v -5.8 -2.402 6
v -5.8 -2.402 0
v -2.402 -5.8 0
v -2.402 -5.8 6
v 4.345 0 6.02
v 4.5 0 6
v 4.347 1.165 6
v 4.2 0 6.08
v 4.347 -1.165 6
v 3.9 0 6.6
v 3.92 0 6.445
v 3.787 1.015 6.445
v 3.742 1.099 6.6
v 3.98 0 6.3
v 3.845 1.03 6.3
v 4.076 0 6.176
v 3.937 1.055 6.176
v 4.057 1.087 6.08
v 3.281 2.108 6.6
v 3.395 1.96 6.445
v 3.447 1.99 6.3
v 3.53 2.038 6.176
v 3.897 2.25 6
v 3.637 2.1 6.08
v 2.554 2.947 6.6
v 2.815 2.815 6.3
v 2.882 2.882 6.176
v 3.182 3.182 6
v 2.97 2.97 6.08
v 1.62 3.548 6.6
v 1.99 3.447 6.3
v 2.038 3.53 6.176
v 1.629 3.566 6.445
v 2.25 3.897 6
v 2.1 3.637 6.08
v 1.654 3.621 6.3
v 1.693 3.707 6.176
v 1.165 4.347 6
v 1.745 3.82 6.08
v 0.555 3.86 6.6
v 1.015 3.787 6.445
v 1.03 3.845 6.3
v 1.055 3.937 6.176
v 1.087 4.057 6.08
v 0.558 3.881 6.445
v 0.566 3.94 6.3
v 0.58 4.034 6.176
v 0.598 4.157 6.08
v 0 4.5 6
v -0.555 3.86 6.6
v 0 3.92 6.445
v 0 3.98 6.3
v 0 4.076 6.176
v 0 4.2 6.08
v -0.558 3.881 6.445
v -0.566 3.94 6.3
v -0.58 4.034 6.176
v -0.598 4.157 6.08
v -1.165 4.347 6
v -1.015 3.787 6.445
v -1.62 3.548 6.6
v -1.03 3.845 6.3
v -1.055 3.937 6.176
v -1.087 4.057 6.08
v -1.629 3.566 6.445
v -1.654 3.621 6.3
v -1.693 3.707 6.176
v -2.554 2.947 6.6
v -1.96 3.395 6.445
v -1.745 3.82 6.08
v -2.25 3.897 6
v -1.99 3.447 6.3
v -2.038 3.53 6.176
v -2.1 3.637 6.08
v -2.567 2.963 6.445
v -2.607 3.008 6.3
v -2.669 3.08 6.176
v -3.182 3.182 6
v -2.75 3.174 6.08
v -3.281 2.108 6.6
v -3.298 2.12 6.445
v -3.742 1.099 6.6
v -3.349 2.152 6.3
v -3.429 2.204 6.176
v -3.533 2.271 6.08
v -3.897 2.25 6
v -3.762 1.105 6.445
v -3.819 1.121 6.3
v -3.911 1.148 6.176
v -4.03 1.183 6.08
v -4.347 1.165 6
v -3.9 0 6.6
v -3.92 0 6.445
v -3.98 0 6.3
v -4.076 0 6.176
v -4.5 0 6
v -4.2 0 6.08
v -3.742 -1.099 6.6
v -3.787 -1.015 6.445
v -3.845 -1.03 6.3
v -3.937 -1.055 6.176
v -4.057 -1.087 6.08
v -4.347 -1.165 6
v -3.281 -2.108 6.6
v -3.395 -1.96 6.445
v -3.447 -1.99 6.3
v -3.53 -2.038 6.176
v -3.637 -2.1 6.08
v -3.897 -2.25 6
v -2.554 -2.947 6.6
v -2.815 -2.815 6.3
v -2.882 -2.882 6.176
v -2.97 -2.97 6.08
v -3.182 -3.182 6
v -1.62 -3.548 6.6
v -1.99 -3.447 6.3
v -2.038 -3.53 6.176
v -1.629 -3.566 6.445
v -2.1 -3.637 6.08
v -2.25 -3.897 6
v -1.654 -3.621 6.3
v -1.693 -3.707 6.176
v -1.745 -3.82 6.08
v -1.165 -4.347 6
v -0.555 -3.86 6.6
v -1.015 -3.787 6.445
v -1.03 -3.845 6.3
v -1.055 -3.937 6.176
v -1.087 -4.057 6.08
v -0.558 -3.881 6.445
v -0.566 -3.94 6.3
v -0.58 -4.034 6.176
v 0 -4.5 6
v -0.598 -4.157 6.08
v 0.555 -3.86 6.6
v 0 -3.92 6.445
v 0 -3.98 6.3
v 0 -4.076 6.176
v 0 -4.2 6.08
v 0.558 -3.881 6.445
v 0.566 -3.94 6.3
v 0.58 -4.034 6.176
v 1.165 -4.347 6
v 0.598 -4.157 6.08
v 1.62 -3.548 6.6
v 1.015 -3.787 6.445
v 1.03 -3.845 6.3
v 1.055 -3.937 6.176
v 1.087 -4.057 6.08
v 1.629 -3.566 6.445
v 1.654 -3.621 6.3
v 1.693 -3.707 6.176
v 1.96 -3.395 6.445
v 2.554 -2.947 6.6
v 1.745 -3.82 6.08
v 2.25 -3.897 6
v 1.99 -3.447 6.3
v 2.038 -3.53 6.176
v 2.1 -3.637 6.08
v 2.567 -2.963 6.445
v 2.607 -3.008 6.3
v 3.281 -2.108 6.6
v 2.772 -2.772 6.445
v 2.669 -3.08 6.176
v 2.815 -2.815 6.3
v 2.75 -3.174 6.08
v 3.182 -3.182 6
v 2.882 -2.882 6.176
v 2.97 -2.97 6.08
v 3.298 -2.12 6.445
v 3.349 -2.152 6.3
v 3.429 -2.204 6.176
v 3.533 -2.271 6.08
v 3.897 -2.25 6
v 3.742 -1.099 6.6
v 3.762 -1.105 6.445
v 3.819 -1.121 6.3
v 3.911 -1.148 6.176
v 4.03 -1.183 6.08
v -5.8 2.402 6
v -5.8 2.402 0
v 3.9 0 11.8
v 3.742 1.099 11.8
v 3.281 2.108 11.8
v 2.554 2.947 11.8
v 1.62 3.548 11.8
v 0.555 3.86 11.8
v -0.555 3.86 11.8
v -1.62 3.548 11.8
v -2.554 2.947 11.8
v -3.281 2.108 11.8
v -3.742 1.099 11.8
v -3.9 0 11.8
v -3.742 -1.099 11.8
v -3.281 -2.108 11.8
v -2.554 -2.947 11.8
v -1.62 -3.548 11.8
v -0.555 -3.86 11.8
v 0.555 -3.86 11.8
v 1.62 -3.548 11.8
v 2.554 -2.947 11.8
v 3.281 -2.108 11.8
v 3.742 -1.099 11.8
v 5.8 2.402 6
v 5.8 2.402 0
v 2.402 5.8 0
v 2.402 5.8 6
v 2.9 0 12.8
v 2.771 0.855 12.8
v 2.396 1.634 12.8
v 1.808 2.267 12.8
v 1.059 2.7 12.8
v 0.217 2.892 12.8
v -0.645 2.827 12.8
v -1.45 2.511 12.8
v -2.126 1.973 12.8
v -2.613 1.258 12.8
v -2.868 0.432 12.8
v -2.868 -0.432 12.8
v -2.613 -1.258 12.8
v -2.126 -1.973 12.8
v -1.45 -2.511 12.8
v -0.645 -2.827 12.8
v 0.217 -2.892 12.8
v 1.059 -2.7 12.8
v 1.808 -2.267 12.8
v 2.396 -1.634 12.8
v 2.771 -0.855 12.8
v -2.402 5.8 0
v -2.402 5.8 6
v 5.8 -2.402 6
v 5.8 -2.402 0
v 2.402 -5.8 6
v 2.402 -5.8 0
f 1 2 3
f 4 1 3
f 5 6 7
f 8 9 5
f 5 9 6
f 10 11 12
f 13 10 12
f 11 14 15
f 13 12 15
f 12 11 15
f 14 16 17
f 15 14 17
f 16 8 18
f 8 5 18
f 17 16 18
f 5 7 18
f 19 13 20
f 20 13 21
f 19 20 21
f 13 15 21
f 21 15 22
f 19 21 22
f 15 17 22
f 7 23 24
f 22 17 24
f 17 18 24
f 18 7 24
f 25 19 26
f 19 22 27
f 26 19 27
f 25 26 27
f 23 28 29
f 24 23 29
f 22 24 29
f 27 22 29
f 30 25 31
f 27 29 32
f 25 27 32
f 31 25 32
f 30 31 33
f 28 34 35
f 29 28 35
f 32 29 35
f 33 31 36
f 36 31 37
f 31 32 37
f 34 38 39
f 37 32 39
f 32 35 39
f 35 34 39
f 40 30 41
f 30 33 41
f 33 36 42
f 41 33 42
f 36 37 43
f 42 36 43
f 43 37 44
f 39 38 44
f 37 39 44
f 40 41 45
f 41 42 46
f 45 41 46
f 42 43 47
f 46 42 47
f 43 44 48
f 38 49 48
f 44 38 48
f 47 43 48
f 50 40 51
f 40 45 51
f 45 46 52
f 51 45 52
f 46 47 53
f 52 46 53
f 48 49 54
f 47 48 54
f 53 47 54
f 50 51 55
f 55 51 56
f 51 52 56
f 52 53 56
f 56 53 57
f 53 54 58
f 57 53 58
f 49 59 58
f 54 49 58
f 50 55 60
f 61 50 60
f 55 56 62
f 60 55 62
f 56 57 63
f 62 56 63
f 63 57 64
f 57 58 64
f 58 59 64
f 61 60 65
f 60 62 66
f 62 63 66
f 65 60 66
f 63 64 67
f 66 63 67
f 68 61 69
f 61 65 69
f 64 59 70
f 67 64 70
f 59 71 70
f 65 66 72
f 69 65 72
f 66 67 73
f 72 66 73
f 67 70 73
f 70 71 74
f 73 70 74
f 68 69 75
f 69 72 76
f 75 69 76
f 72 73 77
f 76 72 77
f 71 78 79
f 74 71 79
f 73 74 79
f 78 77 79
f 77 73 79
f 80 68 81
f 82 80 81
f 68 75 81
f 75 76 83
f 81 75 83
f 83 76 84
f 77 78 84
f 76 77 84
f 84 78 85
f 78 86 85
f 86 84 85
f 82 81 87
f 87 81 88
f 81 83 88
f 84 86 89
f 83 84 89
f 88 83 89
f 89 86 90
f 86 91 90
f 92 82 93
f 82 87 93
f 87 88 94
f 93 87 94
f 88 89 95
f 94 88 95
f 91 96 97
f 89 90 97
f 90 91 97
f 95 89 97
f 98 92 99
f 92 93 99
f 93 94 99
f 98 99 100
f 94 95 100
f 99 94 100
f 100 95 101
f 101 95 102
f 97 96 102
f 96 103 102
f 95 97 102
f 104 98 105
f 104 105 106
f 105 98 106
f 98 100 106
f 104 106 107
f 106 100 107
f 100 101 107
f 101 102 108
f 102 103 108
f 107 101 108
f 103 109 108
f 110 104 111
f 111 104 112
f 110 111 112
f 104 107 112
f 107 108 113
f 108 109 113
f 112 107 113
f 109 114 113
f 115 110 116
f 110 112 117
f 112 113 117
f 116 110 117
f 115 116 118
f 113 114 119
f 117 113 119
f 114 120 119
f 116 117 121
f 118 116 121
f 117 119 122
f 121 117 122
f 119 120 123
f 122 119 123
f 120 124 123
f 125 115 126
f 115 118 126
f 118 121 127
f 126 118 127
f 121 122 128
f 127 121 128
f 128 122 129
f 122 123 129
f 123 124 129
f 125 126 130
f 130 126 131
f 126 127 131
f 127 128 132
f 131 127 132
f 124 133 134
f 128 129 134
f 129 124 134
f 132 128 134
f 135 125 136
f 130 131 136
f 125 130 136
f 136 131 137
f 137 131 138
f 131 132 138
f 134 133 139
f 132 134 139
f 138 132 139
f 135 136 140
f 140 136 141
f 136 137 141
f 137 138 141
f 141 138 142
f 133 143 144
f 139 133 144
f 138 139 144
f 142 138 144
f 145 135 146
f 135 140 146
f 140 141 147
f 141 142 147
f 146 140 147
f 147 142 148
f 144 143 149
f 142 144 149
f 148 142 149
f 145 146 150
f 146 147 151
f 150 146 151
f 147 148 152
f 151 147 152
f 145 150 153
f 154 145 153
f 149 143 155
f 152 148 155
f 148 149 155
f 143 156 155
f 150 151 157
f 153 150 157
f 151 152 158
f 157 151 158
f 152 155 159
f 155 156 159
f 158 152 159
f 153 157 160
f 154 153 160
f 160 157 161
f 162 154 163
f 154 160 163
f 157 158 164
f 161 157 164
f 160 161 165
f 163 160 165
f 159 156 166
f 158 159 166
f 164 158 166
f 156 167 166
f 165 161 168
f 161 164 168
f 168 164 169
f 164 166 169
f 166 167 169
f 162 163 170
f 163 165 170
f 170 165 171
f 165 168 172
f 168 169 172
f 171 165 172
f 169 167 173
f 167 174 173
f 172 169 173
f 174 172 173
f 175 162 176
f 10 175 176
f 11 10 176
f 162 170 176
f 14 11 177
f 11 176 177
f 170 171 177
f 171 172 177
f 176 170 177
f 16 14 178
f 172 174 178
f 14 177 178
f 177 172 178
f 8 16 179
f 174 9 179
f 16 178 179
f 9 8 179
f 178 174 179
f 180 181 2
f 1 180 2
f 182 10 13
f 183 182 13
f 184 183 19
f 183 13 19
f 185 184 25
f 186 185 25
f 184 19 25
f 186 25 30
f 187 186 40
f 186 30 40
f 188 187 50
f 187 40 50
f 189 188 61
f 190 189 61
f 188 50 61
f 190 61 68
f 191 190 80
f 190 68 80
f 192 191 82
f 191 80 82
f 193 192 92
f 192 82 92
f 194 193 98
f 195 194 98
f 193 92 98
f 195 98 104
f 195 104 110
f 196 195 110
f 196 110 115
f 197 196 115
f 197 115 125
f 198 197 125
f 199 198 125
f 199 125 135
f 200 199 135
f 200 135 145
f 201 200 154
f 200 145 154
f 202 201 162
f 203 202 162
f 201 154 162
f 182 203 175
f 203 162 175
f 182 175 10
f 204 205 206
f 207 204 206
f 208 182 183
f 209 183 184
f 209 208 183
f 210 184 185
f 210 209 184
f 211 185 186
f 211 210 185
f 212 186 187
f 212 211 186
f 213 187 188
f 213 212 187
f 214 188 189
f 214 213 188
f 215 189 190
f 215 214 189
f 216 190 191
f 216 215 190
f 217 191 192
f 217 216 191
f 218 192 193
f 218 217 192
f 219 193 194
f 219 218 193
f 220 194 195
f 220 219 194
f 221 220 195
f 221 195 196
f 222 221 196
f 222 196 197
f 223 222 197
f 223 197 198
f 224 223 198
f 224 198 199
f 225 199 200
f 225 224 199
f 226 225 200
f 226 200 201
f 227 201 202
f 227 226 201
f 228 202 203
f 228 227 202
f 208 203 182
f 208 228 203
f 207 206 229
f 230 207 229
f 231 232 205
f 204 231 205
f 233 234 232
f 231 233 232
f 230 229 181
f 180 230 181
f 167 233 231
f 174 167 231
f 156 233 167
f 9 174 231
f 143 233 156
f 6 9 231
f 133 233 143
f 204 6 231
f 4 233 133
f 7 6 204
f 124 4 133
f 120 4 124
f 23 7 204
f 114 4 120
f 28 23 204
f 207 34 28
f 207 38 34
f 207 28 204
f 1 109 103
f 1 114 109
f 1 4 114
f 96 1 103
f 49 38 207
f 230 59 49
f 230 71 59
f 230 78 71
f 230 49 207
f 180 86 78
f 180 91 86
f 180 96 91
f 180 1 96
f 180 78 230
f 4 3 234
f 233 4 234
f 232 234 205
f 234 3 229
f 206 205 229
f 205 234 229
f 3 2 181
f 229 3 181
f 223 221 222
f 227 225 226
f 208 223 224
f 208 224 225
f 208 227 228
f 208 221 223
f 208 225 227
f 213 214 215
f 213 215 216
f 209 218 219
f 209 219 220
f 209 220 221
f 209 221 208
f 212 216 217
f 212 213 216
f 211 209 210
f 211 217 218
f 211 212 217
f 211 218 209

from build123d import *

# Parameters (mm, degrees)
SALIENTE_EXTRUIR1_DEPTH = 6
CROQUIS2_R              = 3.9
SALIENTE_EXTRUIR2_DEPTH = 6.8
CHAFL_N1_SIZE           = 1
REDONDEO1_R             = 0.6


with BuildPart() as part:
    # Croquis1 → Saliente-Extruir1 (new body)
    with BuildSketch(Plane(origin=(0, 0, 0), x_dir=(0, 1, 0), z_dir=(0, 0, 1))):
        Polygon((5.8, -2.402438662), (5.8, 2.402438662), (2.402438662, 5.8), (-2.402438662, 5.8), (-5.8, 2.402438662), (-5.8, -2.402438662), (-2.402438662, -5.8), (2.402438662, -5.8), align=None)
    extrude(amount=SALIENTE_EXTRUIR1_DEPTH)

    # Croquis2 → Saliente-Extruir2 (add)
    with BuildSketch(Plane.XY.offset(6)):
        Circle(CROQUIS2_R)
    extrude(amount=SALIENTE_EXTRUIR2_DEPTH)

    # Chaflán1
    chafl_n1_edges = [part.edges().sort_by_distance(p)[0] for p in [
        (-3.9, 0, 12.8),
    ]]
    chamfer(chafl_n1_edges, length=CHAFL_N1_SIZE)

    # Redondeo1
    redondeo1_edges = [part.edges().sort_by_distance(p)[0] for p in [
        (-3.9, 0, 6),
    ]]
    fillet(redondeo1_edges, radius=REDONDEO1_R)


solid = part.part
